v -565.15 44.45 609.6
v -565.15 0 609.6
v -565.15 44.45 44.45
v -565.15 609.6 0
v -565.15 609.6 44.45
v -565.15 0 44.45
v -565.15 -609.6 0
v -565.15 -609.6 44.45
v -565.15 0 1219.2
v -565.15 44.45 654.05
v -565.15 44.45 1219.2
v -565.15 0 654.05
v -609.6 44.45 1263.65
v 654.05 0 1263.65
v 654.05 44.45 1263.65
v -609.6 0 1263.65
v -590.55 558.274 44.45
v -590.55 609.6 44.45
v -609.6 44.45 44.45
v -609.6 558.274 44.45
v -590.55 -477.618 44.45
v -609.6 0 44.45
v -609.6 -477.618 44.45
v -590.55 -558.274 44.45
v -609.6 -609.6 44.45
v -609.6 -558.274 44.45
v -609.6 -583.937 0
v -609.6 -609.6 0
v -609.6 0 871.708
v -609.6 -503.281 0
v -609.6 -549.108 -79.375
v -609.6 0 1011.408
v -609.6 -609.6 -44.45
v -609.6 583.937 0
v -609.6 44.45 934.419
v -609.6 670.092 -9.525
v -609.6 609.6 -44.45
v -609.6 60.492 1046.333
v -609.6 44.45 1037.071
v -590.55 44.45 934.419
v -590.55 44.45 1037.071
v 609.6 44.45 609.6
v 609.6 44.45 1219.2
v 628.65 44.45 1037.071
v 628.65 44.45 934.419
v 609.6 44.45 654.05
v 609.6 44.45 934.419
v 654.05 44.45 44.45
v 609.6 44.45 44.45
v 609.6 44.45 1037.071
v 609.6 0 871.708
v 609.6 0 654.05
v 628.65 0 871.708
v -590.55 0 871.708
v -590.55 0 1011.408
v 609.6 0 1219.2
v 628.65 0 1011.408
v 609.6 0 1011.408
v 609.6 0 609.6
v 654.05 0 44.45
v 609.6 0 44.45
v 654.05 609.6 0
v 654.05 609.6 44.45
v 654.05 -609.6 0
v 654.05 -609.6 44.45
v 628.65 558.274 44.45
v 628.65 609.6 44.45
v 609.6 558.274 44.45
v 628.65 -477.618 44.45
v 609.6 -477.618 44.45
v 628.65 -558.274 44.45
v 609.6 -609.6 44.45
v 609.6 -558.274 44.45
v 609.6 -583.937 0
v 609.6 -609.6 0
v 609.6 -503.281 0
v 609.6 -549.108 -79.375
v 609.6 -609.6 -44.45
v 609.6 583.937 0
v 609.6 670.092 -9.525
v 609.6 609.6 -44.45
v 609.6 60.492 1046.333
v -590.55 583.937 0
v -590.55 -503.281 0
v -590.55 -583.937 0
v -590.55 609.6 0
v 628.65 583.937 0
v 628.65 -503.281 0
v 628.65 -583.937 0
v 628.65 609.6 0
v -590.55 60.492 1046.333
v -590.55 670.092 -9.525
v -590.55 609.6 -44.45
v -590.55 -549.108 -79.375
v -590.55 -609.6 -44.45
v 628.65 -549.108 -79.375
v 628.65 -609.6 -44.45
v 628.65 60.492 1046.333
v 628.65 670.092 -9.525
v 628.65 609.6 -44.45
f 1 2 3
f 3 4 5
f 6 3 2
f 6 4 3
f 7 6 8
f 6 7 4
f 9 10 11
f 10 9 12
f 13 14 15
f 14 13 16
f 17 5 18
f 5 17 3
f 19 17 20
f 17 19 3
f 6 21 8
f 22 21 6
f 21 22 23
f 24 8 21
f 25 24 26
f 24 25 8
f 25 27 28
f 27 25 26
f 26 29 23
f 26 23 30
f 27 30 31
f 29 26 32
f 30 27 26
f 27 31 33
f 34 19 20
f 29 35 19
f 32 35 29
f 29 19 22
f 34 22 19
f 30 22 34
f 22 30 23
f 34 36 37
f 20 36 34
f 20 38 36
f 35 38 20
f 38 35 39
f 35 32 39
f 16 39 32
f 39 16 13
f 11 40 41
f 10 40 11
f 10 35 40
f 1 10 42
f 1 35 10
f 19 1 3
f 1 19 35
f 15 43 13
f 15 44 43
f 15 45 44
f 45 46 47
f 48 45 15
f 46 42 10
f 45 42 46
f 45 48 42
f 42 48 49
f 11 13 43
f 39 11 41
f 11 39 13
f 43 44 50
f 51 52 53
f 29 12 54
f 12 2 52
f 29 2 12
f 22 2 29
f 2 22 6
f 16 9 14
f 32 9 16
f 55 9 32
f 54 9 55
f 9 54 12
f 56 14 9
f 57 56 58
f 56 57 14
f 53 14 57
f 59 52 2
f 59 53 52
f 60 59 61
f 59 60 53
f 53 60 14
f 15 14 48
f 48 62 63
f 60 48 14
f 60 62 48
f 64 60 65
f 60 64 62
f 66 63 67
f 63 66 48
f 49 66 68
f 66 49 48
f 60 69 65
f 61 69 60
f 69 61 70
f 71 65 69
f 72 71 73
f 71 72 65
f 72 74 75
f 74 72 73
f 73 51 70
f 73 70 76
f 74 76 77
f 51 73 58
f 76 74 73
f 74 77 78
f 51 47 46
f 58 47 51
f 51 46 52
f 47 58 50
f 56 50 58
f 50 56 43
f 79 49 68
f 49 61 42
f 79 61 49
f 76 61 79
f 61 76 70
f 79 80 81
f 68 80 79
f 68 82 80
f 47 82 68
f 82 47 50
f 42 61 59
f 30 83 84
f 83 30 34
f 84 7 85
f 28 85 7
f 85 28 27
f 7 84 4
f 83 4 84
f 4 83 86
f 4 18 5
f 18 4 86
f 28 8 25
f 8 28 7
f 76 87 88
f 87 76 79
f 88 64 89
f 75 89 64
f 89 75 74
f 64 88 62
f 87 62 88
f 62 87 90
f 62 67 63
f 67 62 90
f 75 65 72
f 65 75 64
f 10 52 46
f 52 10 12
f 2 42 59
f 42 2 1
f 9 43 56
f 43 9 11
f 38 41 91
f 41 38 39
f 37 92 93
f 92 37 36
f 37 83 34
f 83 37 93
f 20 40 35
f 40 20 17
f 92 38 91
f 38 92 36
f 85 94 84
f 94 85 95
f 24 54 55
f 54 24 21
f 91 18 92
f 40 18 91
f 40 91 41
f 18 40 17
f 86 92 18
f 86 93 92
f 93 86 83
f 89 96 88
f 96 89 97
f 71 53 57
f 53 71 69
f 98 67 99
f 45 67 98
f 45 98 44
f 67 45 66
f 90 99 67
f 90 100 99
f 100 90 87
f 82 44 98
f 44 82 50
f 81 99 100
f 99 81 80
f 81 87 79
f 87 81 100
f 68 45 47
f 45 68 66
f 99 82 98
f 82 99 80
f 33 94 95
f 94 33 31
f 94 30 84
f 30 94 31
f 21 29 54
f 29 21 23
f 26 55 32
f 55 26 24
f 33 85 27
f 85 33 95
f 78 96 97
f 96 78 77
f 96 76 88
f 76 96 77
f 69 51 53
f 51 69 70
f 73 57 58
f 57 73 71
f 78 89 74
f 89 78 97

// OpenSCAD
one=25.4*.75;
two=25.4*1.75;
three=25.4*2.75;

for(X=[-1,1]) translate([(25.4*24)*X, 0,two]) cube([two, two, (25.4*48)]);

for(X=[-1,1]) translate([(25.4*24)*X, -(25.4*24),0]) cube([two, (25.4*48), two]);

for(Z=[(25.4*24), (25.4*48)]) translate([-(25.4*24),0,Z]) cube([(25.4*48), two, two]);


for(X=[-1,1]) translate([(25.4*24)*X, (25.4*24), -two]) rotate([30,0,0]) cube([one, three, (25.4*48)]);

for(X=[-1,1]) translate([(25.4*24)*X, -(25.4*24), -two]) rotate([-30,0,0]) cube([one, three, (25.4*48)]);
